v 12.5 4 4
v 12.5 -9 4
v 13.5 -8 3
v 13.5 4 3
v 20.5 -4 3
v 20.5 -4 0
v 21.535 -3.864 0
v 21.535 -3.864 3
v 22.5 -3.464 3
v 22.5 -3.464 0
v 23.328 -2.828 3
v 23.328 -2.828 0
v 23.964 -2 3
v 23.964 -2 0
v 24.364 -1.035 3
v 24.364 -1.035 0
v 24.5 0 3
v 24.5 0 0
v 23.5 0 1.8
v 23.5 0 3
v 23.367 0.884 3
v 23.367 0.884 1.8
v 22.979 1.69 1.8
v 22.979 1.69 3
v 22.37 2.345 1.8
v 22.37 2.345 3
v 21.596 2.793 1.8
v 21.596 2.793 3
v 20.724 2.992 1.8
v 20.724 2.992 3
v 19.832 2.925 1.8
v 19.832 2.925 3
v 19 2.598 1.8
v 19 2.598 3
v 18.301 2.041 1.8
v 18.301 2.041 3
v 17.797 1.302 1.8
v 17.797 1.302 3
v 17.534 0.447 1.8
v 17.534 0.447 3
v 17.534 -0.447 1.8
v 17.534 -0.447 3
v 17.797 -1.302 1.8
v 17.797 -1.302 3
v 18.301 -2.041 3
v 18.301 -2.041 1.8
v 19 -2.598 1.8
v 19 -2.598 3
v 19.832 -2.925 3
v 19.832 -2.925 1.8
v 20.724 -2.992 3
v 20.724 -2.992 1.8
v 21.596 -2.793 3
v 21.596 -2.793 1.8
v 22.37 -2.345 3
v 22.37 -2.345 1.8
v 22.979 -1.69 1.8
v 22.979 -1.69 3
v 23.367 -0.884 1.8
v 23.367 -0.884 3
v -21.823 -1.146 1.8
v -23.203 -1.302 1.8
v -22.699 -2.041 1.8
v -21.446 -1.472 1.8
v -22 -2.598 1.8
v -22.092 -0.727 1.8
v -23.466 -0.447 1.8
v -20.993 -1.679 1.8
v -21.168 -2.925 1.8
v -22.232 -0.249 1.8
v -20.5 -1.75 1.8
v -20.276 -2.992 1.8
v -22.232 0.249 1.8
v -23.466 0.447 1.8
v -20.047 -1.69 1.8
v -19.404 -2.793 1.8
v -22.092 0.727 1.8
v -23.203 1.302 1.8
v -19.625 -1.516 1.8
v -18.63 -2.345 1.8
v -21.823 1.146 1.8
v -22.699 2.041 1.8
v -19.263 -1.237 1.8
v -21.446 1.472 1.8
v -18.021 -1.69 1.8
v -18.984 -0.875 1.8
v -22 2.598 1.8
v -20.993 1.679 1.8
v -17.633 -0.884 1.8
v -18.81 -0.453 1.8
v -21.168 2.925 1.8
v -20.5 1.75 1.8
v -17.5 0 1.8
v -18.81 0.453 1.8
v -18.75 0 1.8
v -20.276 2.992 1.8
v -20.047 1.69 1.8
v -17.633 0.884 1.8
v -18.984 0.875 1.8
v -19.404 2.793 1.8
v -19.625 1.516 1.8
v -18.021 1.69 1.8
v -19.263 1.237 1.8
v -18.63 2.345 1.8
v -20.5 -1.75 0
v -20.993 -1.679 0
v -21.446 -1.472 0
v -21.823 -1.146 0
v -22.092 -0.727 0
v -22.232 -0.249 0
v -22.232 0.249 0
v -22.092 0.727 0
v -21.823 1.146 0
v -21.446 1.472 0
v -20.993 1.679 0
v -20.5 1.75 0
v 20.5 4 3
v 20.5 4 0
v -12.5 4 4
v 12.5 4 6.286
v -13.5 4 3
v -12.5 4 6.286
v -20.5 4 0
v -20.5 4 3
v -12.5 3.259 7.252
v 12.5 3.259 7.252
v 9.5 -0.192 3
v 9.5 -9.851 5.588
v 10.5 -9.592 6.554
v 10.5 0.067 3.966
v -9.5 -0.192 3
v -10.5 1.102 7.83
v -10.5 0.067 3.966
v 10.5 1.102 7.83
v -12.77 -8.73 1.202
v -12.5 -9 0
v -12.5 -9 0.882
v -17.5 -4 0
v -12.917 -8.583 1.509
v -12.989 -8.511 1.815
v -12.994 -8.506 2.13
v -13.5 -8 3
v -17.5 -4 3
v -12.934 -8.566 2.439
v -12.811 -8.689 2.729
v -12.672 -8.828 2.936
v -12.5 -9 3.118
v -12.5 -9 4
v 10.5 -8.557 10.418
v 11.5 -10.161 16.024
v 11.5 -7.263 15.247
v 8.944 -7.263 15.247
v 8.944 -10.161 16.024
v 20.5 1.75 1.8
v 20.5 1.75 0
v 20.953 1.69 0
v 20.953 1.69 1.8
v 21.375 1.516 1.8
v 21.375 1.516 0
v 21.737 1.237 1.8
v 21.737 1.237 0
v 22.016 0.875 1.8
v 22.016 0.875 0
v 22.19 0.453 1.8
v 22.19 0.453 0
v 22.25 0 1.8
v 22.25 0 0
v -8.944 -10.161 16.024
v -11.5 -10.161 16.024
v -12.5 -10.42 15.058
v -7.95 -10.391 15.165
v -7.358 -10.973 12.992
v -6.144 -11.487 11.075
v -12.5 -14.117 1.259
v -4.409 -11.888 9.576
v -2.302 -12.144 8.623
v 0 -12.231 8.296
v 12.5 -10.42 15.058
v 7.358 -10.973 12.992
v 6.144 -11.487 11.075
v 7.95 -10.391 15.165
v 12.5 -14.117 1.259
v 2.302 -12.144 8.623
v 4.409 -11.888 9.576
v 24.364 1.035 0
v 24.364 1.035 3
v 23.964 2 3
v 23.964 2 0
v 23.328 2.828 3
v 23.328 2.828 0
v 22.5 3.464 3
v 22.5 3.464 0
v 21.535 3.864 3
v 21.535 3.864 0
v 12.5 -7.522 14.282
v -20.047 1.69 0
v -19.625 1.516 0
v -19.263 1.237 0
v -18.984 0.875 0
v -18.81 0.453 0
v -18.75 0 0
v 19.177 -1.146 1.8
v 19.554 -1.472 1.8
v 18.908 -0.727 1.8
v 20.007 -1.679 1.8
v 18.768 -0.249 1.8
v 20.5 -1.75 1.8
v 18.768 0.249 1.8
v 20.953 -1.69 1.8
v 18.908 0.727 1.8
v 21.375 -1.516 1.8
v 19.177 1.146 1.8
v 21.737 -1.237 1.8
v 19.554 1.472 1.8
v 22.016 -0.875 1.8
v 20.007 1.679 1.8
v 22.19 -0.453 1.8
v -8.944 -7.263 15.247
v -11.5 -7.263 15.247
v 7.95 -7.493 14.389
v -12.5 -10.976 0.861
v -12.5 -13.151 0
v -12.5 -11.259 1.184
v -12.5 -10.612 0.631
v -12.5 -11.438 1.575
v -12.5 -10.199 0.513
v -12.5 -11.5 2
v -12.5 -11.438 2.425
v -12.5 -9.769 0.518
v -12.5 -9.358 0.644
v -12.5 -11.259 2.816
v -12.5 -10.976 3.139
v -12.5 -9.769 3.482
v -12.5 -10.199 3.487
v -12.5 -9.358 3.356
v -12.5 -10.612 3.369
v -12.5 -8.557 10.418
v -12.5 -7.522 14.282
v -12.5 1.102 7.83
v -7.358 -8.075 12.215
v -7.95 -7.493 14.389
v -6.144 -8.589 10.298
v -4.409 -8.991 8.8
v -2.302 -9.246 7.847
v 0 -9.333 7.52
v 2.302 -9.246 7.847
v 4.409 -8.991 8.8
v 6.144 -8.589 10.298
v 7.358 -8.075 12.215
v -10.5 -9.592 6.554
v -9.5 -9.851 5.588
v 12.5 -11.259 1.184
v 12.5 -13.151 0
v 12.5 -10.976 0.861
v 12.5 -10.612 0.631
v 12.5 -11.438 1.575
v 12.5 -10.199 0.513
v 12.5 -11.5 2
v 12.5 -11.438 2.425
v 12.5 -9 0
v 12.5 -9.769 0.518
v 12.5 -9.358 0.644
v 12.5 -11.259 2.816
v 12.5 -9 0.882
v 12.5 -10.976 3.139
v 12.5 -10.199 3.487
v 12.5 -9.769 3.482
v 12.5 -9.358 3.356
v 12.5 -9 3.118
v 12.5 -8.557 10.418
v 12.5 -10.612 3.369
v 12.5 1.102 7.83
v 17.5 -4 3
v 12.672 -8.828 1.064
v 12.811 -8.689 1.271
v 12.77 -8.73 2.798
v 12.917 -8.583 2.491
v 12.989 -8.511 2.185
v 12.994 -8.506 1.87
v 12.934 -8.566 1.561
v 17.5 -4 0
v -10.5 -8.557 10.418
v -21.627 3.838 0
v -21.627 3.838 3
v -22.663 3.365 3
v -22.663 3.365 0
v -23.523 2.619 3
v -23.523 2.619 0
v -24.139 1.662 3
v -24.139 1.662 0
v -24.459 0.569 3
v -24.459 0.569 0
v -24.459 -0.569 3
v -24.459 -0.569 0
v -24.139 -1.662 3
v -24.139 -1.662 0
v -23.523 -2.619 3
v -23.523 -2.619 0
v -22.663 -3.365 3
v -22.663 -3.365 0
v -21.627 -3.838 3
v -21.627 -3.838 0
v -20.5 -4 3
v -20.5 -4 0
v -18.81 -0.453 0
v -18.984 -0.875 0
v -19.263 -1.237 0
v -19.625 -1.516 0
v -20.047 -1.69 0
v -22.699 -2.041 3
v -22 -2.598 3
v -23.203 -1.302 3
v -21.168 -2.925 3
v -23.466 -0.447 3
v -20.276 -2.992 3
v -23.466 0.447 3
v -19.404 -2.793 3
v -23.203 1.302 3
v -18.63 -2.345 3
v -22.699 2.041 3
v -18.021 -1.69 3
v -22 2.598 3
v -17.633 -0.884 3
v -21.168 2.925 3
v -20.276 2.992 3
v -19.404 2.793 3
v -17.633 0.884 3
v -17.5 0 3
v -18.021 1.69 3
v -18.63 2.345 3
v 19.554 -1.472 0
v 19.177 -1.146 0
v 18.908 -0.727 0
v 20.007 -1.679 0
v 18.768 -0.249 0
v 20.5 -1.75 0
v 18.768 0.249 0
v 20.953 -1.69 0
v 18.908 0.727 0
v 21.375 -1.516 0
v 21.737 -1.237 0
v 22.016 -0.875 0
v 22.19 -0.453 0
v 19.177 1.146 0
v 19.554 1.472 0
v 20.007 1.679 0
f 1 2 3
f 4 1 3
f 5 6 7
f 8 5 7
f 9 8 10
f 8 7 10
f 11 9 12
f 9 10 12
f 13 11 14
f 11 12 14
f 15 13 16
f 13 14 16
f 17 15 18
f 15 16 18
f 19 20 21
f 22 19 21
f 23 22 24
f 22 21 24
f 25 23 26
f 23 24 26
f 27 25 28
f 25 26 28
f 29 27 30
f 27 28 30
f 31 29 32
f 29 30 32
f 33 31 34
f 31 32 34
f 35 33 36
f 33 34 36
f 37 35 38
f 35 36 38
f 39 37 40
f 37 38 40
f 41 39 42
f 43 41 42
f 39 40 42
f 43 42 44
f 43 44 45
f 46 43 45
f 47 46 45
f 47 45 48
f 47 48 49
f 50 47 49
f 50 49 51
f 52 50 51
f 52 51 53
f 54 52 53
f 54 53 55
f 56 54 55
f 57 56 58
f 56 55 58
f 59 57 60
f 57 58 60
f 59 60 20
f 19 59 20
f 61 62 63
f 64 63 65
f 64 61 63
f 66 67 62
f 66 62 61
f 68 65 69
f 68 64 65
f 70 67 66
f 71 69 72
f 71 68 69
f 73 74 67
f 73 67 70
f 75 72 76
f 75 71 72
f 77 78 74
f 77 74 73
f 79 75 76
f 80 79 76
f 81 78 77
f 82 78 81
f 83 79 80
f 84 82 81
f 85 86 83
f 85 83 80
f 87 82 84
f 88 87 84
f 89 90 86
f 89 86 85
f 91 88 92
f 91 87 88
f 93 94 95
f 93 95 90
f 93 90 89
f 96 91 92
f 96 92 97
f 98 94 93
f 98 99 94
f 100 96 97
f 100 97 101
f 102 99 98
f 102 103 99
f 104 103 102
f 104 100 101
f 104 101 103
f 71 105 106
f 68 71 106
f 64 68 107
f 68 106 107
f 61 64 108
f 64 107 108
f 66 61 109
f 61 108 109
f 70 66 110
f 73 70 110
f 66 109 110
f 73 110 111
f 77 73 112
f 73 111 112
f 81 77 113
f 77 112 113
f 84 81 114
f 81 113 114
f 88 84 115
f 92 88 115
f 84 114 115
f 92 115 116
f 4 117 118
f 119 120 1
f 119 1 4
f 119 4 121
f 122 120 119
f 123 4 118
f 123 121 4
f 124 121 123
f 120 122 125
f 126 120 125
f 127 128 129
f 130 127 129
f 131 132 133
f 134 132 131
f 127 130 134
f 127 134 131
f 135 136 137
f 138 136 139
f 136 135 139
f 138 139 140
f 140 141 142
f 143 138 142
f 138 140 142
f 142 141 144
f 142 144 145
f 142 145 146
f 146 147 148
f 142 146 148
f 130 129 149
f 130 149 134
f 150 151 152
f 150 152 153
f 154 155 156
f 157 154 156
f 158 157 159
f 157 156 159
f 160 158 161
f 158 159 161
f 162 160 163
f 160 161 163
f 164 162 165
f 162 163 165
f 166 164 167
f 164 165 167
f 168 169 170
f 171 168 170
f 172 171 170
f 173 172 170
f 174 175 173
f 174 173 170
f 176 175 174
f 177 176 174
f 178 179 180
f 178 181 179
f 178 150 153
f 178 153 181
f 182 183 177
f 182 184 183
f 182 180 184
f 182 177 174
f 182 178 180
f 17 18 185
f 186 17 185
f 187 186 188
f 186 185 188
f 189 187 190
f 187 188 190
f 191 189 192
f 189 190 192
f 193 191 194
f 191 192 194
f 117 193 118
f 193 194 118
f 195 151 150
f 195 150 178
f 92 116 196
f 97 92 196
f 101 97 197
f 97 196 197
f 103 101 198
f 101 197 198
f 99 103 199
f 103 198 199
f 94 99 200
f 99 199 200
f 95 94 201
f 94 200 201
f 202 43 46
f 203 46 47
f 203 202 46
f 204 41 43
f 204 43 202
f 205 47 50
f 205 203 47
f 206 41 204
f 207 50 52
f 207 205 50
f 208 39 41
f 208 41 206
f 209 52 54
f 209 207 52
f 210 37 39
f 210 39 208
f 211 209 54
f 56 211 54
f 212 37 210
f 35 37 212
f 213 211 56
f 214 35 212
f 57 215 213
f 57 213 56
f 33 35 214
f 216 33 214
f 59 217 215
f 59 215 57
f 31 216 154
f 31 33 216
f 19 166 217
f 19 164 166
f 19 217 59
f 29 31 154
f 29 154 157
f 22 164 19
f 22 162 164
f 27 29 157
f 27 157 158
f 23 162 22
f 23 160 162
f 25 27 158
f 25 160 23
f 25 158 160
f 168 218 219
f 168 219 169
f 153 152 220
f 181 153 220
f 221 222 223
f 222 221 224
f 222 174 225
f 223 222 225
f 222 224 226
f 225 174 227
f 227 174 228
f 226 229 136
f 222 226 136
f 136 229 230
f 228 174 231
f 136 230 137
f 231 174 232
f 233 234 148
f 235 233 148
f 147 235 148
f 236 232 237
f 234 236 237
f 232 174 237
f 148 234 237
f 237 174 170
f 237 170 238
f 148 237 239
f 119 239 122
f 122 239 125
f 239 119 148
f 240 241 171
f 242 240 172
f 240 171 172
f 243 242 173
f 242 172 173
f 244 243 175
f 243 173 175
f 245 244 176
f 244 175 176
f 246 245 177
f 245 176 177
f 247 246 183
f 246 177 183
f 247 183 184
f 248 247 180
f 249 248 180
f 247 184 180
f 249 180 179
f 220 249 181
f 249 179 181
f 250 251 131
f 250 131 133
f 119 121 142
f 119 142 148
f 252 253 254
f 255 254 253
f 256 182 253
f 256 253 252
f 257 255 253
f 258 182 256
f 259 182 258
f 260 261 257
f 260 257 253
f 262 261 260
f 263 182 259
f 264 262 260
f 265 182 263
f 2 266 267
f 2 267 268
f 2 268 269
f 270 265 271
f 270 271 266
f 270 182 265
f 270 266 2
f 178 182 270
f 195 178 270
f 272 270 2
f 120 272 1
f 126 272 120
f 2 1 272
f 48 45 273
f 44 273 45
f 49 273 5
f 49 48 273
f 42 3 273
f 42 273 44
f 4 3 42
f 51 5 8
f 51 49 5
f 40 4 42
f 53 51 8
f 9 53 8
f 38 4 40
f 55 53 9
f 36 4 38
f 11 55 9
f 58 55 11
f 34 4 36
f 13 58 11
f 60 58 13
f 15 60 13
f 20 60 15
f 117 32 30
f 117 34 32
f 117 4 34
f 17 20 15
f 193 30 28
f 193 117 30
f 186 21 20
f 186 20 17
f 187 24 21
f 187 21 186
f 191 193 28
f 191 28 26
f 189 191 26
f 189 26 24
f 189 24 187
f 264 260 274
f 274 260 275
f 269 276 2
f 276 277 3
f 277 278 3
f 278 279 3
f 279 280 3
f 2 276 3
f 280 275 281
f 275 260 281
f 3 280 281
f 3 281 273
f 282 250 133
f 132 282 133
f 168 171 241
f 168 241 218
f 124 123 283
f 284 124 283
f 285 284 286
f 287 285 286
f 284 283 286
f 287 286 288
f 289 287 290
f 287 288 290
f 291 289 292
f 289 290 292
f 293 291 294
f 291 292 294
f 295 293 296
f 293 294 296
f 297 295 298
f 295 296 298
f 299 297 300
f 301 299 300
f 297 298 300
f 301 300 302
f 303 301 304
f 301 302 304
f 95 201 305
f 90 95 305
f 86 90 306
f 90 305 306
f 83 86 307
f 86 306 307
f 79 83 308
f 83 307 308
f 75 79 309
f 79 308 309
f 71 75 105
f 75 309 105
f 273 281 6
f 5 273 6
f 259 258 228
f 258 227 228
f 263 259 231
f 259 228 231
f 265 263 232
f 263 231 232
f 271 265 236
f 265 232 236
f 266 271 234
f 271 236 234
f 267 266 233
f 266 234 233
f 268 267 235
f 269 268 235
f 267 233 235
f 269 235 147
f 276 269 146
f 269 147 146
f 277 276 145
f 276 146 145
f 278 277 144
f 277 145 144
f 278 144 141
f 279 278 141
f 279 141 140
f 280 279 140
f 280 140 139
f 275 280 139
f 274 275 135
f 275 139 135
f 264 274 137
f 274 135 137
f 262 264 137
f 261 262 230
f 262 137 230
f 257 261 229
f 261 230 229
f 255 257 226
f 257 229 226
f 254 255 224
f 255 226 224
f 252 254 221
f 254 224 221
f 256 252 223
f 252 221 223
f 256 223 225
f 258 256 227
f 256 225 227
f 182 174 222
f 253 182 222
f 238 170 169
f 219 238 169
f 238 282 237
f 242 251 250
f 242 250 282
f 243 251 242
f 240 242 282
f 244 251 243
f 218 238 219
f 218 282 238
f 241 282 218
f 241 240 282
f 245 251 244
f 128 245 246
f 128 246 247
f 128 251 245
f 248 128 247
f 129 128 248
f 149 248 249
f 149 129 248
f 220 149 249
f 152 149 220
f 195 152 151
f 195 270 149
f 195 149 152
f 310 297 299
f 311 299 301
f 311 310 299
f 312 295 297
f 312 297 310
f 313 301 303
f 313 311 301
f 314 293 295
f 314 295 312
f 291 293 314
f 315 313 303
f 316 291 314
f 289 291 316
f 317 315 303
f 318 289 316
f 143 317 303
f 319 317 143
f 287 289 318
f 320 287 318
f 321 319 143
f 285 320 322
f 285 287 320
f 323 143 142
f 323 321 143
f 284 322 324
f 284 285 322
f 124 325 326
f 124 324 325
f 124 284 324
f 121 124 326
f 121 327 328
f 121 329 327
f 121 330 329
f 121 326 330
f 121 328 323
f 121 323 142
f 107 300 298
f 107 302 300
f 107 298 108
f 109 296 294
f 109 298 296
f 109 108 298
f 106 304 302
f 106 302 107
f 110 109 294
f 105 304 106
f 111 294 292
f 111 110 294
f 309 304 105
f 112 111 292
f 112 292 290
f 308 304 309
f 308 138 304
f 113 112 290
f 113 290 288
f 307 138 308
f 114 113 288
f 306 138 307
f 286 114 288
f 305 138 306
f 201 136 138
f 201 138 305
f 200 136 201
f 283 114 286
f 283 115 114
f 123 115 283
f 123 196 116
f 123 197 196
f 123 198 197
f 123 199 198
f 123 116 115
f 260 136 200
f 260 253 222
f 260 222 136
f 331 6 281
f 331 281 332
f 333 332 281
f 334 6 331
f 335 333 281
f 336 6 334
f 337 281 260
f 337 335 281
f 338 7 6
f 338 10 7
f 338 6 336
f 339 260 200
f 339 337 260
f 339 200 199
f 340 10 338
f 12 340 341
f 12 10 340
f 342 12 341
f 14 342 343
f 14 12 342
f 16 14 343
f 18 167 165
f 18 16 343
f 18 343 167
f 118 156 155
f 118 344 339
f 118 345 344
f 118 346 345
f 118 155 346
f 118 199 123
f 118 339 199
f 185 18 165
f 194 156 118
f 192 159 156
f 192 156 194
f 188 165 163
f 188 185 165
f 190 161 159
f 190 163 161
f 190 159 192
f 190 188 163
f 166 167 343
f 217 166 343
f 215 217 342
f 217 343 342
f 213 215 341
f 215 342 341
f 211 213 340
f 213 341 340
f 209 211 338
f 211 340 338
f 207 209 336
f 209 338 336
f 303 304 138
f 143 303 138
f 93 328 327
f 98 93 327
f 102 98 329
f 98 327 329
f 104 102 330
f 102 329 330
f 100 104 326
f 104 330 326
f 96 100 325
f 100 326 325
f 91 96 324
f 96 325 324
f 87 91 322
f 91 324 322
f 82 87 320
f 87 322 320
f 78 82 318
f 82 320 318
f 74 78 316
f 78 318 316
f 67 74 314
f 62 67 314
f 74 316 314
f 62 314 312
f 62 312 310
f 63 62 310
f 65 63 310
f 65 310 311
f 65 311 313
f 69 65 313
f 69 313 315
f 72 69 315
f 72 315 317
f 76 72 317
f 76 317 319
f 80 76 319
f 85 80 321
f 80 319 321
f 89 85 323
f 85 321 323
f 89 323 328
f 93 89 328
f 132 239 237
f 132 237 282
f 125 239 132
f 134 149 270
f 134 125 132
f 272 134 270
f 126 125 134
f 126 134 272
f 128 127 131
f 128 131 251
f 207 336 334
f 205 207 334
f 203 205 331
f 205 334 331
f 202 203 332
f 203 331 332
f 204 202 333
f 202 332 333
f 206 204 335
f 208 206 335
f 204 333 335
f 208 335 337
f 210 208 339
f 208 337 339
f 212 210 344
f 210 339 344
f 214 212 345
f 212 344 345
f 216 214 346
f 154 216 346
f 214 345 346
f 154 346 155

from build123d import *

# Parameters (mm, degrees)
F2_DEPTH       = 3
F3_R           = 3
F4_DEPTH       = 1.2
F5_DEPTH       = 12.5
F6_W           = 2
F6_H           = 10
F7_DEPTH       = 5
F9_DEPTH       = 3
F10_SIZE       = 5
F11_T1_DEPTH   = 15.1433659759
F11_T3_DEPTH   = 15.1433659759
F11_T5_DEPTH   = 8
F11_T10_DEPTH  = 7.571682988
F11_T15_DEPTH  = 7.571682988
F11_T17_DEPTH  = 7.8722554791
F11_T19_DEPTH  = 31.6397752967
F11_T21_DEPTH  = 8.1433659759
F11_T23_DEPTH  = 28.997160307
F12_R          = 1.5
F13_DEPTH      = 37.001
F13_DEPTH_BACK = 12.001


# Not quite as in the source:
# - a fillet or chamfer that OpenCascade refuses, or shapes differently, is made with other operations: its cross-section is extruded or revolved along the edge and cut away or added


with BuildPart() as f2:
    # F0 (on Top) → F2 (new body)
    with BuildSketch(Plane.XY):
        with BuildLine():
            ThreePointArc((20.5, -4), (16.5, 0), (20.5, 4))
            Line((20.5, 4), (-20.5, 4))
            ThreePointArc((-20.5, 4), (-17.6715728753, 2.8284271247), (-16.5, 0))
            ThreePointArc((-16.5, 0), (-17.6715728753, -2.8284271247), (-20.5, -4))
            Line((-20.5, -4), (20.5, -4))
        make_face()
        with BuildLine():
            ThreePointArc((24.5, 0), (23.3284271247, 2.8284271247), (20.5, 4))
            Line((20.5, 4), (20.5, 1.75))
            ThreePointArc((20.5, 1.75), (21.7374368671, 1.2374368671), (22.25, 0))
            ThreePointArc((22.25, 0), (21.7374368671, -1.2374368671), (20.5, -1.75))
            Line((20.5, -1.75), (20.5, -4))
            ThreePointArc((20.5, -4), (23.3284271247, -2.8284271247), (24.5, 0))
        make_face()
        with BuildLine():
            Line((20.5, 1.75), (20.5, 4))
            ThreePointArc((20.5, 4), (16.5, 0), (20.5, -4))
            Line((20.5, -4), (20.5, -1.75))
            ThreePointArc((20.5, -1.75), (18.75, 0), (20.5, 1.75))
        make_face()
        with BuildLine():
            ThreePointArc((-16.5, 0), (-17.6715728753, 2.8284271247), (-20.5, 4))
            Line((-20.5, 4), (-20.5, 1.75))
            ThreePointArc((-20.5, 1.75), (-19.2625631329, 1.2374368671), (-18.75, 0))
            ThreePointArc((-18.75, 0), (-19.2625631329, -1.2374368671), (-20.5, -1.75))
            Line((-20.5, -1.75), (-20.5, -4))
            ThreePointArc((-20.5, -4), (-17.6715728753, -2.8284271247), (-16.5, 0))
        make_face()
        with BuildLine():
            Line((-20.5, 1.75), (-20.5, 4))
            ThreePointArc((-20.5, 4), (-24.5, 0), (-20.5, -4))
            Line((-20.5, -4), (-20.5, -1.75))
            ThreePointArc((-20.5, -1.75), (-22.25, 0), (-20.5, 1.75))
        make_face()
    extrude(amount=F2_DEPTH)

    # F3 (on face) → F4 (cut)
    with BuildSketch(Plane.XY.offset(3)):
        with Locations((-20.5, 0)):
            Circle(F3_R)
        with Locations((20.5, 0)):
            Circle(F3_R)
    extrude(amount=-F4_DEPTH, mode=Mode.SUBTRACT)

    # F1 (on Right) → F5 (join, symmetric)
    with BuildSketch(Plane.YZ):
        Polygon((-14.454310627, 0), (0, 0), (4, 0), (4, 7.0531719961), (1.1022225211, 7.8296291314), (-0.1918727044, 3), (-9.8511309673, 5.588190451), (-7.2629405162, 15.2474487139), (-10.1607179951, 16.0239058492), align=None)
    extrude(amount=F5_DEPTH, both=True)

    # F6 (on face) → F7 (join, through all)
    with BuildSketch(Plane(origin=(0, 0.737146966, 2.7510699296), x_dir=(1, 0, 0), z_dir=(0, 0.2588190451, 0.9659258263))):
        with Locations((11.5, -5.9617919358)):
            Rectangle(F6_W, F6_H)
        with Locations((-11.5, -5.9617919358)):
            Rectangle(F6_W, F6_H)
    extrude(amount=F7_DEPTH)

    # F8 (on face) → F9 (cut, through all)
    with BuildSketch(Plane(origin=(0, -13.4860554121, 3.6135776568), x_dir=(1, 0, 0), z_dir=(0, -0.9659258263, 0.2588190451))):
        with BuildLine():
            ThreePointArc((-8, 12.8481171687), (0, 4.8481171687), (8, 12.8481171687))
            Line((8, 12.8481171687), (-8, 12.8481171687))
        make_face()
    extrude(amount=-F9_DEPTH, mode=Mode.SUBTRACT)

    # F10
    f10_edges = [f2.edges().sort_by_distance(p)[0] for p in [
        (-12.5, -4, 1.5),
        (12.5, -4, 1.5),
    ]]
    chamfer(f10_edges, length=F10_SIZE)

    # F11: chamfer of 1 on 12 edges, made by hand

    # F11_s2 → F11_t1 (join)
    with BuildSketch(Plane(origin=(0, -13.0723329483, 3.5027210567), x_dir=(1, 0, 0), z_dir=(0, 0.9659258263, -0.2588190451))):
        Polygon((-9.5, -2.8481171687), (-10.5, -3.8481171687), (-10.5, -2.8481171687), align=None)
    extrude(amount=F11_T1_DEPTH)

    # F11_s4 → F11_t3 (join)
    with BuildSketch(Plane(origin=(0, 1.5550353448, -0.4166704648), x_dir=(1, 0, 0), z_dir=(0, -0.9659258263, 0.2588190451))):
        Polygon((9.5, 2.8481171687), (10.5, 3.8481171687), (10.5, 2.8481171687), align=None)
    extrude(amount=F11_T3_DEPTH)

    # F11_s6 → F11_t5 (join)
    with BuildSketch(Plane.XZ.offset(-4)):
        Polygon((12.5, 4), (13.5, 3), (12.5, 3), align=None)
        Polygon((-13.5, 3), (-12.5, 4), (-12.5, 3), align=None)
    extrude(amount=F11_T5_DEPTH)


with BuildPart() as f11_tool8:
    # F11_s9 → F11_t10 (new body)
    with BuildSketch(Plane.XZ.offset(4)):
        Polygon((-13.5, 3), (-12.5, 4), (-12.5, 3), align=None)
    extrude(amount=F11_T10_DEPTH)

    split(bisect_by=Plane(origin=(-10.75, -10.75, 0), x_dir=(0, 0, 1), z_dir=(0.7071067812, 0.7071067812, 0)), keep=Keep.TOP)


with BuildPart() as f2_1:
    add(f2.part)

    # F11_t7: union F11_tool8
    add(f11_tool8.part)


with BuildPart() as f11_tool13:
    # F11_s14 → F11_t15 (new body)
    with BuildSketch(Plane.XZ.offset(4)):
        Polygon((12.5, 4), (13.5, 3), (12.5, 3), align=None)
    extrude(amount=F11_T15_DEPTH)

    split(bisect_by=Plane(origin=(10.75, -10.75, 0), x_dir=(0, 0, 1), z_dir=(-0.7071067812, 0.7071067812, 0)), keep=Keep.TOP)


with BuildPart() as f2_2:
    add(f2_1.part)

    # F11_t12: union F11_tool13
    add(f11_tool13.part)

    # F11_s18 → F11_t17 (cut)
    with BuildSketch(Plane(origin=(0, -15.8391741119, 4.244093912), x_dir=(1, 0, 0), z_dir=(0, 0.9659258263, -0.2588190451))):
        with BuildLine():
            Line((-7.95046392, -11.9592282798), (-8.94427191, -12.8481171687))
            Line((-8.94427191, -12.8481171687), (-8, -12.8481171687))
            ThreePointArc((-8, -12.8481171687), (-7.9868043053, -12.3888166251), (-7.95046392, -11.9592282798))
        make_face()
        with BuildLine():
            Line((8.94427191, -12.8481171687), (7.95046392, -11.9592282798))
            ThreePointArc((7.95046392, -11.9592282798), (7.9868043053, -12.3888166251), (8, -12.8481171687))
            Line((8, -12.8481171687), (8.94427191, -12.8481171687))
        make_face()
    extrude(amount=F11_T17_DEPTH, mode=Mode.SUBTRACT)

    # F11_s20 → F11_t19 (cut)
    with BuildSketch(Plane.YZ.offset(-15.8198876484)):
        Polygon((-14.1170110805, 1.2588190451), (-13.1510852542, 0), (-14.454310627, 0), align=None)
    extrude(amount=F11_T19_DEPTH, mode=Mode.SUBTRACT)

    # F11_s22 → F11_t21 (cut)
    with BuildSketch(Plane(origin=(0, -8.1042229181, 2.1715199862), x_dir=(1, 0, 0), z_dir=(0, -0.9659258263, 0.2588190451))):
        Polygon((-12.5, 11.8481171687), (-11.5, 12.8481171687), (-12.5, 12.8481171687), align=None)
        Polygon((11.5, 12.8481171687), (12.5, 11.8481171687), (12.5, 12.8481171687), align=None)
    extrude(amount=F11_T21_DEPTH, mode=Mode.SUBTRACT)

    # F11_s24 → F11_t23 (cut)
    with BuildSketch(Plane.YZ.offset(-14.4985801535)):
        Polygon((4, 6.2858450082), (3.2588190451, 7.2517708344), (4, 7.0531719961), align=None)
    extrude(amount=F11_T23_DEPTH, mode=Mode.SUBTRACT)

    # F12 (on face) → F13 (cut, two sides)
    with BuildSketch(Plane(origin=(-12.5, 0, 0), x_dir=(0, -1, 0), z_dir=(-1, 0, 0))) as f13_sk:
        with Locations((10, 2)):
            Circle(F12_R)
    extrude(amount=-F13_DEPTH, mode=Mode.SUBTRACT)
    extrude(f13_sk.sketch, amount=F13_DEPTH_BACK, mode=Mode.SUBTRACT)


solid = f2_2.part
